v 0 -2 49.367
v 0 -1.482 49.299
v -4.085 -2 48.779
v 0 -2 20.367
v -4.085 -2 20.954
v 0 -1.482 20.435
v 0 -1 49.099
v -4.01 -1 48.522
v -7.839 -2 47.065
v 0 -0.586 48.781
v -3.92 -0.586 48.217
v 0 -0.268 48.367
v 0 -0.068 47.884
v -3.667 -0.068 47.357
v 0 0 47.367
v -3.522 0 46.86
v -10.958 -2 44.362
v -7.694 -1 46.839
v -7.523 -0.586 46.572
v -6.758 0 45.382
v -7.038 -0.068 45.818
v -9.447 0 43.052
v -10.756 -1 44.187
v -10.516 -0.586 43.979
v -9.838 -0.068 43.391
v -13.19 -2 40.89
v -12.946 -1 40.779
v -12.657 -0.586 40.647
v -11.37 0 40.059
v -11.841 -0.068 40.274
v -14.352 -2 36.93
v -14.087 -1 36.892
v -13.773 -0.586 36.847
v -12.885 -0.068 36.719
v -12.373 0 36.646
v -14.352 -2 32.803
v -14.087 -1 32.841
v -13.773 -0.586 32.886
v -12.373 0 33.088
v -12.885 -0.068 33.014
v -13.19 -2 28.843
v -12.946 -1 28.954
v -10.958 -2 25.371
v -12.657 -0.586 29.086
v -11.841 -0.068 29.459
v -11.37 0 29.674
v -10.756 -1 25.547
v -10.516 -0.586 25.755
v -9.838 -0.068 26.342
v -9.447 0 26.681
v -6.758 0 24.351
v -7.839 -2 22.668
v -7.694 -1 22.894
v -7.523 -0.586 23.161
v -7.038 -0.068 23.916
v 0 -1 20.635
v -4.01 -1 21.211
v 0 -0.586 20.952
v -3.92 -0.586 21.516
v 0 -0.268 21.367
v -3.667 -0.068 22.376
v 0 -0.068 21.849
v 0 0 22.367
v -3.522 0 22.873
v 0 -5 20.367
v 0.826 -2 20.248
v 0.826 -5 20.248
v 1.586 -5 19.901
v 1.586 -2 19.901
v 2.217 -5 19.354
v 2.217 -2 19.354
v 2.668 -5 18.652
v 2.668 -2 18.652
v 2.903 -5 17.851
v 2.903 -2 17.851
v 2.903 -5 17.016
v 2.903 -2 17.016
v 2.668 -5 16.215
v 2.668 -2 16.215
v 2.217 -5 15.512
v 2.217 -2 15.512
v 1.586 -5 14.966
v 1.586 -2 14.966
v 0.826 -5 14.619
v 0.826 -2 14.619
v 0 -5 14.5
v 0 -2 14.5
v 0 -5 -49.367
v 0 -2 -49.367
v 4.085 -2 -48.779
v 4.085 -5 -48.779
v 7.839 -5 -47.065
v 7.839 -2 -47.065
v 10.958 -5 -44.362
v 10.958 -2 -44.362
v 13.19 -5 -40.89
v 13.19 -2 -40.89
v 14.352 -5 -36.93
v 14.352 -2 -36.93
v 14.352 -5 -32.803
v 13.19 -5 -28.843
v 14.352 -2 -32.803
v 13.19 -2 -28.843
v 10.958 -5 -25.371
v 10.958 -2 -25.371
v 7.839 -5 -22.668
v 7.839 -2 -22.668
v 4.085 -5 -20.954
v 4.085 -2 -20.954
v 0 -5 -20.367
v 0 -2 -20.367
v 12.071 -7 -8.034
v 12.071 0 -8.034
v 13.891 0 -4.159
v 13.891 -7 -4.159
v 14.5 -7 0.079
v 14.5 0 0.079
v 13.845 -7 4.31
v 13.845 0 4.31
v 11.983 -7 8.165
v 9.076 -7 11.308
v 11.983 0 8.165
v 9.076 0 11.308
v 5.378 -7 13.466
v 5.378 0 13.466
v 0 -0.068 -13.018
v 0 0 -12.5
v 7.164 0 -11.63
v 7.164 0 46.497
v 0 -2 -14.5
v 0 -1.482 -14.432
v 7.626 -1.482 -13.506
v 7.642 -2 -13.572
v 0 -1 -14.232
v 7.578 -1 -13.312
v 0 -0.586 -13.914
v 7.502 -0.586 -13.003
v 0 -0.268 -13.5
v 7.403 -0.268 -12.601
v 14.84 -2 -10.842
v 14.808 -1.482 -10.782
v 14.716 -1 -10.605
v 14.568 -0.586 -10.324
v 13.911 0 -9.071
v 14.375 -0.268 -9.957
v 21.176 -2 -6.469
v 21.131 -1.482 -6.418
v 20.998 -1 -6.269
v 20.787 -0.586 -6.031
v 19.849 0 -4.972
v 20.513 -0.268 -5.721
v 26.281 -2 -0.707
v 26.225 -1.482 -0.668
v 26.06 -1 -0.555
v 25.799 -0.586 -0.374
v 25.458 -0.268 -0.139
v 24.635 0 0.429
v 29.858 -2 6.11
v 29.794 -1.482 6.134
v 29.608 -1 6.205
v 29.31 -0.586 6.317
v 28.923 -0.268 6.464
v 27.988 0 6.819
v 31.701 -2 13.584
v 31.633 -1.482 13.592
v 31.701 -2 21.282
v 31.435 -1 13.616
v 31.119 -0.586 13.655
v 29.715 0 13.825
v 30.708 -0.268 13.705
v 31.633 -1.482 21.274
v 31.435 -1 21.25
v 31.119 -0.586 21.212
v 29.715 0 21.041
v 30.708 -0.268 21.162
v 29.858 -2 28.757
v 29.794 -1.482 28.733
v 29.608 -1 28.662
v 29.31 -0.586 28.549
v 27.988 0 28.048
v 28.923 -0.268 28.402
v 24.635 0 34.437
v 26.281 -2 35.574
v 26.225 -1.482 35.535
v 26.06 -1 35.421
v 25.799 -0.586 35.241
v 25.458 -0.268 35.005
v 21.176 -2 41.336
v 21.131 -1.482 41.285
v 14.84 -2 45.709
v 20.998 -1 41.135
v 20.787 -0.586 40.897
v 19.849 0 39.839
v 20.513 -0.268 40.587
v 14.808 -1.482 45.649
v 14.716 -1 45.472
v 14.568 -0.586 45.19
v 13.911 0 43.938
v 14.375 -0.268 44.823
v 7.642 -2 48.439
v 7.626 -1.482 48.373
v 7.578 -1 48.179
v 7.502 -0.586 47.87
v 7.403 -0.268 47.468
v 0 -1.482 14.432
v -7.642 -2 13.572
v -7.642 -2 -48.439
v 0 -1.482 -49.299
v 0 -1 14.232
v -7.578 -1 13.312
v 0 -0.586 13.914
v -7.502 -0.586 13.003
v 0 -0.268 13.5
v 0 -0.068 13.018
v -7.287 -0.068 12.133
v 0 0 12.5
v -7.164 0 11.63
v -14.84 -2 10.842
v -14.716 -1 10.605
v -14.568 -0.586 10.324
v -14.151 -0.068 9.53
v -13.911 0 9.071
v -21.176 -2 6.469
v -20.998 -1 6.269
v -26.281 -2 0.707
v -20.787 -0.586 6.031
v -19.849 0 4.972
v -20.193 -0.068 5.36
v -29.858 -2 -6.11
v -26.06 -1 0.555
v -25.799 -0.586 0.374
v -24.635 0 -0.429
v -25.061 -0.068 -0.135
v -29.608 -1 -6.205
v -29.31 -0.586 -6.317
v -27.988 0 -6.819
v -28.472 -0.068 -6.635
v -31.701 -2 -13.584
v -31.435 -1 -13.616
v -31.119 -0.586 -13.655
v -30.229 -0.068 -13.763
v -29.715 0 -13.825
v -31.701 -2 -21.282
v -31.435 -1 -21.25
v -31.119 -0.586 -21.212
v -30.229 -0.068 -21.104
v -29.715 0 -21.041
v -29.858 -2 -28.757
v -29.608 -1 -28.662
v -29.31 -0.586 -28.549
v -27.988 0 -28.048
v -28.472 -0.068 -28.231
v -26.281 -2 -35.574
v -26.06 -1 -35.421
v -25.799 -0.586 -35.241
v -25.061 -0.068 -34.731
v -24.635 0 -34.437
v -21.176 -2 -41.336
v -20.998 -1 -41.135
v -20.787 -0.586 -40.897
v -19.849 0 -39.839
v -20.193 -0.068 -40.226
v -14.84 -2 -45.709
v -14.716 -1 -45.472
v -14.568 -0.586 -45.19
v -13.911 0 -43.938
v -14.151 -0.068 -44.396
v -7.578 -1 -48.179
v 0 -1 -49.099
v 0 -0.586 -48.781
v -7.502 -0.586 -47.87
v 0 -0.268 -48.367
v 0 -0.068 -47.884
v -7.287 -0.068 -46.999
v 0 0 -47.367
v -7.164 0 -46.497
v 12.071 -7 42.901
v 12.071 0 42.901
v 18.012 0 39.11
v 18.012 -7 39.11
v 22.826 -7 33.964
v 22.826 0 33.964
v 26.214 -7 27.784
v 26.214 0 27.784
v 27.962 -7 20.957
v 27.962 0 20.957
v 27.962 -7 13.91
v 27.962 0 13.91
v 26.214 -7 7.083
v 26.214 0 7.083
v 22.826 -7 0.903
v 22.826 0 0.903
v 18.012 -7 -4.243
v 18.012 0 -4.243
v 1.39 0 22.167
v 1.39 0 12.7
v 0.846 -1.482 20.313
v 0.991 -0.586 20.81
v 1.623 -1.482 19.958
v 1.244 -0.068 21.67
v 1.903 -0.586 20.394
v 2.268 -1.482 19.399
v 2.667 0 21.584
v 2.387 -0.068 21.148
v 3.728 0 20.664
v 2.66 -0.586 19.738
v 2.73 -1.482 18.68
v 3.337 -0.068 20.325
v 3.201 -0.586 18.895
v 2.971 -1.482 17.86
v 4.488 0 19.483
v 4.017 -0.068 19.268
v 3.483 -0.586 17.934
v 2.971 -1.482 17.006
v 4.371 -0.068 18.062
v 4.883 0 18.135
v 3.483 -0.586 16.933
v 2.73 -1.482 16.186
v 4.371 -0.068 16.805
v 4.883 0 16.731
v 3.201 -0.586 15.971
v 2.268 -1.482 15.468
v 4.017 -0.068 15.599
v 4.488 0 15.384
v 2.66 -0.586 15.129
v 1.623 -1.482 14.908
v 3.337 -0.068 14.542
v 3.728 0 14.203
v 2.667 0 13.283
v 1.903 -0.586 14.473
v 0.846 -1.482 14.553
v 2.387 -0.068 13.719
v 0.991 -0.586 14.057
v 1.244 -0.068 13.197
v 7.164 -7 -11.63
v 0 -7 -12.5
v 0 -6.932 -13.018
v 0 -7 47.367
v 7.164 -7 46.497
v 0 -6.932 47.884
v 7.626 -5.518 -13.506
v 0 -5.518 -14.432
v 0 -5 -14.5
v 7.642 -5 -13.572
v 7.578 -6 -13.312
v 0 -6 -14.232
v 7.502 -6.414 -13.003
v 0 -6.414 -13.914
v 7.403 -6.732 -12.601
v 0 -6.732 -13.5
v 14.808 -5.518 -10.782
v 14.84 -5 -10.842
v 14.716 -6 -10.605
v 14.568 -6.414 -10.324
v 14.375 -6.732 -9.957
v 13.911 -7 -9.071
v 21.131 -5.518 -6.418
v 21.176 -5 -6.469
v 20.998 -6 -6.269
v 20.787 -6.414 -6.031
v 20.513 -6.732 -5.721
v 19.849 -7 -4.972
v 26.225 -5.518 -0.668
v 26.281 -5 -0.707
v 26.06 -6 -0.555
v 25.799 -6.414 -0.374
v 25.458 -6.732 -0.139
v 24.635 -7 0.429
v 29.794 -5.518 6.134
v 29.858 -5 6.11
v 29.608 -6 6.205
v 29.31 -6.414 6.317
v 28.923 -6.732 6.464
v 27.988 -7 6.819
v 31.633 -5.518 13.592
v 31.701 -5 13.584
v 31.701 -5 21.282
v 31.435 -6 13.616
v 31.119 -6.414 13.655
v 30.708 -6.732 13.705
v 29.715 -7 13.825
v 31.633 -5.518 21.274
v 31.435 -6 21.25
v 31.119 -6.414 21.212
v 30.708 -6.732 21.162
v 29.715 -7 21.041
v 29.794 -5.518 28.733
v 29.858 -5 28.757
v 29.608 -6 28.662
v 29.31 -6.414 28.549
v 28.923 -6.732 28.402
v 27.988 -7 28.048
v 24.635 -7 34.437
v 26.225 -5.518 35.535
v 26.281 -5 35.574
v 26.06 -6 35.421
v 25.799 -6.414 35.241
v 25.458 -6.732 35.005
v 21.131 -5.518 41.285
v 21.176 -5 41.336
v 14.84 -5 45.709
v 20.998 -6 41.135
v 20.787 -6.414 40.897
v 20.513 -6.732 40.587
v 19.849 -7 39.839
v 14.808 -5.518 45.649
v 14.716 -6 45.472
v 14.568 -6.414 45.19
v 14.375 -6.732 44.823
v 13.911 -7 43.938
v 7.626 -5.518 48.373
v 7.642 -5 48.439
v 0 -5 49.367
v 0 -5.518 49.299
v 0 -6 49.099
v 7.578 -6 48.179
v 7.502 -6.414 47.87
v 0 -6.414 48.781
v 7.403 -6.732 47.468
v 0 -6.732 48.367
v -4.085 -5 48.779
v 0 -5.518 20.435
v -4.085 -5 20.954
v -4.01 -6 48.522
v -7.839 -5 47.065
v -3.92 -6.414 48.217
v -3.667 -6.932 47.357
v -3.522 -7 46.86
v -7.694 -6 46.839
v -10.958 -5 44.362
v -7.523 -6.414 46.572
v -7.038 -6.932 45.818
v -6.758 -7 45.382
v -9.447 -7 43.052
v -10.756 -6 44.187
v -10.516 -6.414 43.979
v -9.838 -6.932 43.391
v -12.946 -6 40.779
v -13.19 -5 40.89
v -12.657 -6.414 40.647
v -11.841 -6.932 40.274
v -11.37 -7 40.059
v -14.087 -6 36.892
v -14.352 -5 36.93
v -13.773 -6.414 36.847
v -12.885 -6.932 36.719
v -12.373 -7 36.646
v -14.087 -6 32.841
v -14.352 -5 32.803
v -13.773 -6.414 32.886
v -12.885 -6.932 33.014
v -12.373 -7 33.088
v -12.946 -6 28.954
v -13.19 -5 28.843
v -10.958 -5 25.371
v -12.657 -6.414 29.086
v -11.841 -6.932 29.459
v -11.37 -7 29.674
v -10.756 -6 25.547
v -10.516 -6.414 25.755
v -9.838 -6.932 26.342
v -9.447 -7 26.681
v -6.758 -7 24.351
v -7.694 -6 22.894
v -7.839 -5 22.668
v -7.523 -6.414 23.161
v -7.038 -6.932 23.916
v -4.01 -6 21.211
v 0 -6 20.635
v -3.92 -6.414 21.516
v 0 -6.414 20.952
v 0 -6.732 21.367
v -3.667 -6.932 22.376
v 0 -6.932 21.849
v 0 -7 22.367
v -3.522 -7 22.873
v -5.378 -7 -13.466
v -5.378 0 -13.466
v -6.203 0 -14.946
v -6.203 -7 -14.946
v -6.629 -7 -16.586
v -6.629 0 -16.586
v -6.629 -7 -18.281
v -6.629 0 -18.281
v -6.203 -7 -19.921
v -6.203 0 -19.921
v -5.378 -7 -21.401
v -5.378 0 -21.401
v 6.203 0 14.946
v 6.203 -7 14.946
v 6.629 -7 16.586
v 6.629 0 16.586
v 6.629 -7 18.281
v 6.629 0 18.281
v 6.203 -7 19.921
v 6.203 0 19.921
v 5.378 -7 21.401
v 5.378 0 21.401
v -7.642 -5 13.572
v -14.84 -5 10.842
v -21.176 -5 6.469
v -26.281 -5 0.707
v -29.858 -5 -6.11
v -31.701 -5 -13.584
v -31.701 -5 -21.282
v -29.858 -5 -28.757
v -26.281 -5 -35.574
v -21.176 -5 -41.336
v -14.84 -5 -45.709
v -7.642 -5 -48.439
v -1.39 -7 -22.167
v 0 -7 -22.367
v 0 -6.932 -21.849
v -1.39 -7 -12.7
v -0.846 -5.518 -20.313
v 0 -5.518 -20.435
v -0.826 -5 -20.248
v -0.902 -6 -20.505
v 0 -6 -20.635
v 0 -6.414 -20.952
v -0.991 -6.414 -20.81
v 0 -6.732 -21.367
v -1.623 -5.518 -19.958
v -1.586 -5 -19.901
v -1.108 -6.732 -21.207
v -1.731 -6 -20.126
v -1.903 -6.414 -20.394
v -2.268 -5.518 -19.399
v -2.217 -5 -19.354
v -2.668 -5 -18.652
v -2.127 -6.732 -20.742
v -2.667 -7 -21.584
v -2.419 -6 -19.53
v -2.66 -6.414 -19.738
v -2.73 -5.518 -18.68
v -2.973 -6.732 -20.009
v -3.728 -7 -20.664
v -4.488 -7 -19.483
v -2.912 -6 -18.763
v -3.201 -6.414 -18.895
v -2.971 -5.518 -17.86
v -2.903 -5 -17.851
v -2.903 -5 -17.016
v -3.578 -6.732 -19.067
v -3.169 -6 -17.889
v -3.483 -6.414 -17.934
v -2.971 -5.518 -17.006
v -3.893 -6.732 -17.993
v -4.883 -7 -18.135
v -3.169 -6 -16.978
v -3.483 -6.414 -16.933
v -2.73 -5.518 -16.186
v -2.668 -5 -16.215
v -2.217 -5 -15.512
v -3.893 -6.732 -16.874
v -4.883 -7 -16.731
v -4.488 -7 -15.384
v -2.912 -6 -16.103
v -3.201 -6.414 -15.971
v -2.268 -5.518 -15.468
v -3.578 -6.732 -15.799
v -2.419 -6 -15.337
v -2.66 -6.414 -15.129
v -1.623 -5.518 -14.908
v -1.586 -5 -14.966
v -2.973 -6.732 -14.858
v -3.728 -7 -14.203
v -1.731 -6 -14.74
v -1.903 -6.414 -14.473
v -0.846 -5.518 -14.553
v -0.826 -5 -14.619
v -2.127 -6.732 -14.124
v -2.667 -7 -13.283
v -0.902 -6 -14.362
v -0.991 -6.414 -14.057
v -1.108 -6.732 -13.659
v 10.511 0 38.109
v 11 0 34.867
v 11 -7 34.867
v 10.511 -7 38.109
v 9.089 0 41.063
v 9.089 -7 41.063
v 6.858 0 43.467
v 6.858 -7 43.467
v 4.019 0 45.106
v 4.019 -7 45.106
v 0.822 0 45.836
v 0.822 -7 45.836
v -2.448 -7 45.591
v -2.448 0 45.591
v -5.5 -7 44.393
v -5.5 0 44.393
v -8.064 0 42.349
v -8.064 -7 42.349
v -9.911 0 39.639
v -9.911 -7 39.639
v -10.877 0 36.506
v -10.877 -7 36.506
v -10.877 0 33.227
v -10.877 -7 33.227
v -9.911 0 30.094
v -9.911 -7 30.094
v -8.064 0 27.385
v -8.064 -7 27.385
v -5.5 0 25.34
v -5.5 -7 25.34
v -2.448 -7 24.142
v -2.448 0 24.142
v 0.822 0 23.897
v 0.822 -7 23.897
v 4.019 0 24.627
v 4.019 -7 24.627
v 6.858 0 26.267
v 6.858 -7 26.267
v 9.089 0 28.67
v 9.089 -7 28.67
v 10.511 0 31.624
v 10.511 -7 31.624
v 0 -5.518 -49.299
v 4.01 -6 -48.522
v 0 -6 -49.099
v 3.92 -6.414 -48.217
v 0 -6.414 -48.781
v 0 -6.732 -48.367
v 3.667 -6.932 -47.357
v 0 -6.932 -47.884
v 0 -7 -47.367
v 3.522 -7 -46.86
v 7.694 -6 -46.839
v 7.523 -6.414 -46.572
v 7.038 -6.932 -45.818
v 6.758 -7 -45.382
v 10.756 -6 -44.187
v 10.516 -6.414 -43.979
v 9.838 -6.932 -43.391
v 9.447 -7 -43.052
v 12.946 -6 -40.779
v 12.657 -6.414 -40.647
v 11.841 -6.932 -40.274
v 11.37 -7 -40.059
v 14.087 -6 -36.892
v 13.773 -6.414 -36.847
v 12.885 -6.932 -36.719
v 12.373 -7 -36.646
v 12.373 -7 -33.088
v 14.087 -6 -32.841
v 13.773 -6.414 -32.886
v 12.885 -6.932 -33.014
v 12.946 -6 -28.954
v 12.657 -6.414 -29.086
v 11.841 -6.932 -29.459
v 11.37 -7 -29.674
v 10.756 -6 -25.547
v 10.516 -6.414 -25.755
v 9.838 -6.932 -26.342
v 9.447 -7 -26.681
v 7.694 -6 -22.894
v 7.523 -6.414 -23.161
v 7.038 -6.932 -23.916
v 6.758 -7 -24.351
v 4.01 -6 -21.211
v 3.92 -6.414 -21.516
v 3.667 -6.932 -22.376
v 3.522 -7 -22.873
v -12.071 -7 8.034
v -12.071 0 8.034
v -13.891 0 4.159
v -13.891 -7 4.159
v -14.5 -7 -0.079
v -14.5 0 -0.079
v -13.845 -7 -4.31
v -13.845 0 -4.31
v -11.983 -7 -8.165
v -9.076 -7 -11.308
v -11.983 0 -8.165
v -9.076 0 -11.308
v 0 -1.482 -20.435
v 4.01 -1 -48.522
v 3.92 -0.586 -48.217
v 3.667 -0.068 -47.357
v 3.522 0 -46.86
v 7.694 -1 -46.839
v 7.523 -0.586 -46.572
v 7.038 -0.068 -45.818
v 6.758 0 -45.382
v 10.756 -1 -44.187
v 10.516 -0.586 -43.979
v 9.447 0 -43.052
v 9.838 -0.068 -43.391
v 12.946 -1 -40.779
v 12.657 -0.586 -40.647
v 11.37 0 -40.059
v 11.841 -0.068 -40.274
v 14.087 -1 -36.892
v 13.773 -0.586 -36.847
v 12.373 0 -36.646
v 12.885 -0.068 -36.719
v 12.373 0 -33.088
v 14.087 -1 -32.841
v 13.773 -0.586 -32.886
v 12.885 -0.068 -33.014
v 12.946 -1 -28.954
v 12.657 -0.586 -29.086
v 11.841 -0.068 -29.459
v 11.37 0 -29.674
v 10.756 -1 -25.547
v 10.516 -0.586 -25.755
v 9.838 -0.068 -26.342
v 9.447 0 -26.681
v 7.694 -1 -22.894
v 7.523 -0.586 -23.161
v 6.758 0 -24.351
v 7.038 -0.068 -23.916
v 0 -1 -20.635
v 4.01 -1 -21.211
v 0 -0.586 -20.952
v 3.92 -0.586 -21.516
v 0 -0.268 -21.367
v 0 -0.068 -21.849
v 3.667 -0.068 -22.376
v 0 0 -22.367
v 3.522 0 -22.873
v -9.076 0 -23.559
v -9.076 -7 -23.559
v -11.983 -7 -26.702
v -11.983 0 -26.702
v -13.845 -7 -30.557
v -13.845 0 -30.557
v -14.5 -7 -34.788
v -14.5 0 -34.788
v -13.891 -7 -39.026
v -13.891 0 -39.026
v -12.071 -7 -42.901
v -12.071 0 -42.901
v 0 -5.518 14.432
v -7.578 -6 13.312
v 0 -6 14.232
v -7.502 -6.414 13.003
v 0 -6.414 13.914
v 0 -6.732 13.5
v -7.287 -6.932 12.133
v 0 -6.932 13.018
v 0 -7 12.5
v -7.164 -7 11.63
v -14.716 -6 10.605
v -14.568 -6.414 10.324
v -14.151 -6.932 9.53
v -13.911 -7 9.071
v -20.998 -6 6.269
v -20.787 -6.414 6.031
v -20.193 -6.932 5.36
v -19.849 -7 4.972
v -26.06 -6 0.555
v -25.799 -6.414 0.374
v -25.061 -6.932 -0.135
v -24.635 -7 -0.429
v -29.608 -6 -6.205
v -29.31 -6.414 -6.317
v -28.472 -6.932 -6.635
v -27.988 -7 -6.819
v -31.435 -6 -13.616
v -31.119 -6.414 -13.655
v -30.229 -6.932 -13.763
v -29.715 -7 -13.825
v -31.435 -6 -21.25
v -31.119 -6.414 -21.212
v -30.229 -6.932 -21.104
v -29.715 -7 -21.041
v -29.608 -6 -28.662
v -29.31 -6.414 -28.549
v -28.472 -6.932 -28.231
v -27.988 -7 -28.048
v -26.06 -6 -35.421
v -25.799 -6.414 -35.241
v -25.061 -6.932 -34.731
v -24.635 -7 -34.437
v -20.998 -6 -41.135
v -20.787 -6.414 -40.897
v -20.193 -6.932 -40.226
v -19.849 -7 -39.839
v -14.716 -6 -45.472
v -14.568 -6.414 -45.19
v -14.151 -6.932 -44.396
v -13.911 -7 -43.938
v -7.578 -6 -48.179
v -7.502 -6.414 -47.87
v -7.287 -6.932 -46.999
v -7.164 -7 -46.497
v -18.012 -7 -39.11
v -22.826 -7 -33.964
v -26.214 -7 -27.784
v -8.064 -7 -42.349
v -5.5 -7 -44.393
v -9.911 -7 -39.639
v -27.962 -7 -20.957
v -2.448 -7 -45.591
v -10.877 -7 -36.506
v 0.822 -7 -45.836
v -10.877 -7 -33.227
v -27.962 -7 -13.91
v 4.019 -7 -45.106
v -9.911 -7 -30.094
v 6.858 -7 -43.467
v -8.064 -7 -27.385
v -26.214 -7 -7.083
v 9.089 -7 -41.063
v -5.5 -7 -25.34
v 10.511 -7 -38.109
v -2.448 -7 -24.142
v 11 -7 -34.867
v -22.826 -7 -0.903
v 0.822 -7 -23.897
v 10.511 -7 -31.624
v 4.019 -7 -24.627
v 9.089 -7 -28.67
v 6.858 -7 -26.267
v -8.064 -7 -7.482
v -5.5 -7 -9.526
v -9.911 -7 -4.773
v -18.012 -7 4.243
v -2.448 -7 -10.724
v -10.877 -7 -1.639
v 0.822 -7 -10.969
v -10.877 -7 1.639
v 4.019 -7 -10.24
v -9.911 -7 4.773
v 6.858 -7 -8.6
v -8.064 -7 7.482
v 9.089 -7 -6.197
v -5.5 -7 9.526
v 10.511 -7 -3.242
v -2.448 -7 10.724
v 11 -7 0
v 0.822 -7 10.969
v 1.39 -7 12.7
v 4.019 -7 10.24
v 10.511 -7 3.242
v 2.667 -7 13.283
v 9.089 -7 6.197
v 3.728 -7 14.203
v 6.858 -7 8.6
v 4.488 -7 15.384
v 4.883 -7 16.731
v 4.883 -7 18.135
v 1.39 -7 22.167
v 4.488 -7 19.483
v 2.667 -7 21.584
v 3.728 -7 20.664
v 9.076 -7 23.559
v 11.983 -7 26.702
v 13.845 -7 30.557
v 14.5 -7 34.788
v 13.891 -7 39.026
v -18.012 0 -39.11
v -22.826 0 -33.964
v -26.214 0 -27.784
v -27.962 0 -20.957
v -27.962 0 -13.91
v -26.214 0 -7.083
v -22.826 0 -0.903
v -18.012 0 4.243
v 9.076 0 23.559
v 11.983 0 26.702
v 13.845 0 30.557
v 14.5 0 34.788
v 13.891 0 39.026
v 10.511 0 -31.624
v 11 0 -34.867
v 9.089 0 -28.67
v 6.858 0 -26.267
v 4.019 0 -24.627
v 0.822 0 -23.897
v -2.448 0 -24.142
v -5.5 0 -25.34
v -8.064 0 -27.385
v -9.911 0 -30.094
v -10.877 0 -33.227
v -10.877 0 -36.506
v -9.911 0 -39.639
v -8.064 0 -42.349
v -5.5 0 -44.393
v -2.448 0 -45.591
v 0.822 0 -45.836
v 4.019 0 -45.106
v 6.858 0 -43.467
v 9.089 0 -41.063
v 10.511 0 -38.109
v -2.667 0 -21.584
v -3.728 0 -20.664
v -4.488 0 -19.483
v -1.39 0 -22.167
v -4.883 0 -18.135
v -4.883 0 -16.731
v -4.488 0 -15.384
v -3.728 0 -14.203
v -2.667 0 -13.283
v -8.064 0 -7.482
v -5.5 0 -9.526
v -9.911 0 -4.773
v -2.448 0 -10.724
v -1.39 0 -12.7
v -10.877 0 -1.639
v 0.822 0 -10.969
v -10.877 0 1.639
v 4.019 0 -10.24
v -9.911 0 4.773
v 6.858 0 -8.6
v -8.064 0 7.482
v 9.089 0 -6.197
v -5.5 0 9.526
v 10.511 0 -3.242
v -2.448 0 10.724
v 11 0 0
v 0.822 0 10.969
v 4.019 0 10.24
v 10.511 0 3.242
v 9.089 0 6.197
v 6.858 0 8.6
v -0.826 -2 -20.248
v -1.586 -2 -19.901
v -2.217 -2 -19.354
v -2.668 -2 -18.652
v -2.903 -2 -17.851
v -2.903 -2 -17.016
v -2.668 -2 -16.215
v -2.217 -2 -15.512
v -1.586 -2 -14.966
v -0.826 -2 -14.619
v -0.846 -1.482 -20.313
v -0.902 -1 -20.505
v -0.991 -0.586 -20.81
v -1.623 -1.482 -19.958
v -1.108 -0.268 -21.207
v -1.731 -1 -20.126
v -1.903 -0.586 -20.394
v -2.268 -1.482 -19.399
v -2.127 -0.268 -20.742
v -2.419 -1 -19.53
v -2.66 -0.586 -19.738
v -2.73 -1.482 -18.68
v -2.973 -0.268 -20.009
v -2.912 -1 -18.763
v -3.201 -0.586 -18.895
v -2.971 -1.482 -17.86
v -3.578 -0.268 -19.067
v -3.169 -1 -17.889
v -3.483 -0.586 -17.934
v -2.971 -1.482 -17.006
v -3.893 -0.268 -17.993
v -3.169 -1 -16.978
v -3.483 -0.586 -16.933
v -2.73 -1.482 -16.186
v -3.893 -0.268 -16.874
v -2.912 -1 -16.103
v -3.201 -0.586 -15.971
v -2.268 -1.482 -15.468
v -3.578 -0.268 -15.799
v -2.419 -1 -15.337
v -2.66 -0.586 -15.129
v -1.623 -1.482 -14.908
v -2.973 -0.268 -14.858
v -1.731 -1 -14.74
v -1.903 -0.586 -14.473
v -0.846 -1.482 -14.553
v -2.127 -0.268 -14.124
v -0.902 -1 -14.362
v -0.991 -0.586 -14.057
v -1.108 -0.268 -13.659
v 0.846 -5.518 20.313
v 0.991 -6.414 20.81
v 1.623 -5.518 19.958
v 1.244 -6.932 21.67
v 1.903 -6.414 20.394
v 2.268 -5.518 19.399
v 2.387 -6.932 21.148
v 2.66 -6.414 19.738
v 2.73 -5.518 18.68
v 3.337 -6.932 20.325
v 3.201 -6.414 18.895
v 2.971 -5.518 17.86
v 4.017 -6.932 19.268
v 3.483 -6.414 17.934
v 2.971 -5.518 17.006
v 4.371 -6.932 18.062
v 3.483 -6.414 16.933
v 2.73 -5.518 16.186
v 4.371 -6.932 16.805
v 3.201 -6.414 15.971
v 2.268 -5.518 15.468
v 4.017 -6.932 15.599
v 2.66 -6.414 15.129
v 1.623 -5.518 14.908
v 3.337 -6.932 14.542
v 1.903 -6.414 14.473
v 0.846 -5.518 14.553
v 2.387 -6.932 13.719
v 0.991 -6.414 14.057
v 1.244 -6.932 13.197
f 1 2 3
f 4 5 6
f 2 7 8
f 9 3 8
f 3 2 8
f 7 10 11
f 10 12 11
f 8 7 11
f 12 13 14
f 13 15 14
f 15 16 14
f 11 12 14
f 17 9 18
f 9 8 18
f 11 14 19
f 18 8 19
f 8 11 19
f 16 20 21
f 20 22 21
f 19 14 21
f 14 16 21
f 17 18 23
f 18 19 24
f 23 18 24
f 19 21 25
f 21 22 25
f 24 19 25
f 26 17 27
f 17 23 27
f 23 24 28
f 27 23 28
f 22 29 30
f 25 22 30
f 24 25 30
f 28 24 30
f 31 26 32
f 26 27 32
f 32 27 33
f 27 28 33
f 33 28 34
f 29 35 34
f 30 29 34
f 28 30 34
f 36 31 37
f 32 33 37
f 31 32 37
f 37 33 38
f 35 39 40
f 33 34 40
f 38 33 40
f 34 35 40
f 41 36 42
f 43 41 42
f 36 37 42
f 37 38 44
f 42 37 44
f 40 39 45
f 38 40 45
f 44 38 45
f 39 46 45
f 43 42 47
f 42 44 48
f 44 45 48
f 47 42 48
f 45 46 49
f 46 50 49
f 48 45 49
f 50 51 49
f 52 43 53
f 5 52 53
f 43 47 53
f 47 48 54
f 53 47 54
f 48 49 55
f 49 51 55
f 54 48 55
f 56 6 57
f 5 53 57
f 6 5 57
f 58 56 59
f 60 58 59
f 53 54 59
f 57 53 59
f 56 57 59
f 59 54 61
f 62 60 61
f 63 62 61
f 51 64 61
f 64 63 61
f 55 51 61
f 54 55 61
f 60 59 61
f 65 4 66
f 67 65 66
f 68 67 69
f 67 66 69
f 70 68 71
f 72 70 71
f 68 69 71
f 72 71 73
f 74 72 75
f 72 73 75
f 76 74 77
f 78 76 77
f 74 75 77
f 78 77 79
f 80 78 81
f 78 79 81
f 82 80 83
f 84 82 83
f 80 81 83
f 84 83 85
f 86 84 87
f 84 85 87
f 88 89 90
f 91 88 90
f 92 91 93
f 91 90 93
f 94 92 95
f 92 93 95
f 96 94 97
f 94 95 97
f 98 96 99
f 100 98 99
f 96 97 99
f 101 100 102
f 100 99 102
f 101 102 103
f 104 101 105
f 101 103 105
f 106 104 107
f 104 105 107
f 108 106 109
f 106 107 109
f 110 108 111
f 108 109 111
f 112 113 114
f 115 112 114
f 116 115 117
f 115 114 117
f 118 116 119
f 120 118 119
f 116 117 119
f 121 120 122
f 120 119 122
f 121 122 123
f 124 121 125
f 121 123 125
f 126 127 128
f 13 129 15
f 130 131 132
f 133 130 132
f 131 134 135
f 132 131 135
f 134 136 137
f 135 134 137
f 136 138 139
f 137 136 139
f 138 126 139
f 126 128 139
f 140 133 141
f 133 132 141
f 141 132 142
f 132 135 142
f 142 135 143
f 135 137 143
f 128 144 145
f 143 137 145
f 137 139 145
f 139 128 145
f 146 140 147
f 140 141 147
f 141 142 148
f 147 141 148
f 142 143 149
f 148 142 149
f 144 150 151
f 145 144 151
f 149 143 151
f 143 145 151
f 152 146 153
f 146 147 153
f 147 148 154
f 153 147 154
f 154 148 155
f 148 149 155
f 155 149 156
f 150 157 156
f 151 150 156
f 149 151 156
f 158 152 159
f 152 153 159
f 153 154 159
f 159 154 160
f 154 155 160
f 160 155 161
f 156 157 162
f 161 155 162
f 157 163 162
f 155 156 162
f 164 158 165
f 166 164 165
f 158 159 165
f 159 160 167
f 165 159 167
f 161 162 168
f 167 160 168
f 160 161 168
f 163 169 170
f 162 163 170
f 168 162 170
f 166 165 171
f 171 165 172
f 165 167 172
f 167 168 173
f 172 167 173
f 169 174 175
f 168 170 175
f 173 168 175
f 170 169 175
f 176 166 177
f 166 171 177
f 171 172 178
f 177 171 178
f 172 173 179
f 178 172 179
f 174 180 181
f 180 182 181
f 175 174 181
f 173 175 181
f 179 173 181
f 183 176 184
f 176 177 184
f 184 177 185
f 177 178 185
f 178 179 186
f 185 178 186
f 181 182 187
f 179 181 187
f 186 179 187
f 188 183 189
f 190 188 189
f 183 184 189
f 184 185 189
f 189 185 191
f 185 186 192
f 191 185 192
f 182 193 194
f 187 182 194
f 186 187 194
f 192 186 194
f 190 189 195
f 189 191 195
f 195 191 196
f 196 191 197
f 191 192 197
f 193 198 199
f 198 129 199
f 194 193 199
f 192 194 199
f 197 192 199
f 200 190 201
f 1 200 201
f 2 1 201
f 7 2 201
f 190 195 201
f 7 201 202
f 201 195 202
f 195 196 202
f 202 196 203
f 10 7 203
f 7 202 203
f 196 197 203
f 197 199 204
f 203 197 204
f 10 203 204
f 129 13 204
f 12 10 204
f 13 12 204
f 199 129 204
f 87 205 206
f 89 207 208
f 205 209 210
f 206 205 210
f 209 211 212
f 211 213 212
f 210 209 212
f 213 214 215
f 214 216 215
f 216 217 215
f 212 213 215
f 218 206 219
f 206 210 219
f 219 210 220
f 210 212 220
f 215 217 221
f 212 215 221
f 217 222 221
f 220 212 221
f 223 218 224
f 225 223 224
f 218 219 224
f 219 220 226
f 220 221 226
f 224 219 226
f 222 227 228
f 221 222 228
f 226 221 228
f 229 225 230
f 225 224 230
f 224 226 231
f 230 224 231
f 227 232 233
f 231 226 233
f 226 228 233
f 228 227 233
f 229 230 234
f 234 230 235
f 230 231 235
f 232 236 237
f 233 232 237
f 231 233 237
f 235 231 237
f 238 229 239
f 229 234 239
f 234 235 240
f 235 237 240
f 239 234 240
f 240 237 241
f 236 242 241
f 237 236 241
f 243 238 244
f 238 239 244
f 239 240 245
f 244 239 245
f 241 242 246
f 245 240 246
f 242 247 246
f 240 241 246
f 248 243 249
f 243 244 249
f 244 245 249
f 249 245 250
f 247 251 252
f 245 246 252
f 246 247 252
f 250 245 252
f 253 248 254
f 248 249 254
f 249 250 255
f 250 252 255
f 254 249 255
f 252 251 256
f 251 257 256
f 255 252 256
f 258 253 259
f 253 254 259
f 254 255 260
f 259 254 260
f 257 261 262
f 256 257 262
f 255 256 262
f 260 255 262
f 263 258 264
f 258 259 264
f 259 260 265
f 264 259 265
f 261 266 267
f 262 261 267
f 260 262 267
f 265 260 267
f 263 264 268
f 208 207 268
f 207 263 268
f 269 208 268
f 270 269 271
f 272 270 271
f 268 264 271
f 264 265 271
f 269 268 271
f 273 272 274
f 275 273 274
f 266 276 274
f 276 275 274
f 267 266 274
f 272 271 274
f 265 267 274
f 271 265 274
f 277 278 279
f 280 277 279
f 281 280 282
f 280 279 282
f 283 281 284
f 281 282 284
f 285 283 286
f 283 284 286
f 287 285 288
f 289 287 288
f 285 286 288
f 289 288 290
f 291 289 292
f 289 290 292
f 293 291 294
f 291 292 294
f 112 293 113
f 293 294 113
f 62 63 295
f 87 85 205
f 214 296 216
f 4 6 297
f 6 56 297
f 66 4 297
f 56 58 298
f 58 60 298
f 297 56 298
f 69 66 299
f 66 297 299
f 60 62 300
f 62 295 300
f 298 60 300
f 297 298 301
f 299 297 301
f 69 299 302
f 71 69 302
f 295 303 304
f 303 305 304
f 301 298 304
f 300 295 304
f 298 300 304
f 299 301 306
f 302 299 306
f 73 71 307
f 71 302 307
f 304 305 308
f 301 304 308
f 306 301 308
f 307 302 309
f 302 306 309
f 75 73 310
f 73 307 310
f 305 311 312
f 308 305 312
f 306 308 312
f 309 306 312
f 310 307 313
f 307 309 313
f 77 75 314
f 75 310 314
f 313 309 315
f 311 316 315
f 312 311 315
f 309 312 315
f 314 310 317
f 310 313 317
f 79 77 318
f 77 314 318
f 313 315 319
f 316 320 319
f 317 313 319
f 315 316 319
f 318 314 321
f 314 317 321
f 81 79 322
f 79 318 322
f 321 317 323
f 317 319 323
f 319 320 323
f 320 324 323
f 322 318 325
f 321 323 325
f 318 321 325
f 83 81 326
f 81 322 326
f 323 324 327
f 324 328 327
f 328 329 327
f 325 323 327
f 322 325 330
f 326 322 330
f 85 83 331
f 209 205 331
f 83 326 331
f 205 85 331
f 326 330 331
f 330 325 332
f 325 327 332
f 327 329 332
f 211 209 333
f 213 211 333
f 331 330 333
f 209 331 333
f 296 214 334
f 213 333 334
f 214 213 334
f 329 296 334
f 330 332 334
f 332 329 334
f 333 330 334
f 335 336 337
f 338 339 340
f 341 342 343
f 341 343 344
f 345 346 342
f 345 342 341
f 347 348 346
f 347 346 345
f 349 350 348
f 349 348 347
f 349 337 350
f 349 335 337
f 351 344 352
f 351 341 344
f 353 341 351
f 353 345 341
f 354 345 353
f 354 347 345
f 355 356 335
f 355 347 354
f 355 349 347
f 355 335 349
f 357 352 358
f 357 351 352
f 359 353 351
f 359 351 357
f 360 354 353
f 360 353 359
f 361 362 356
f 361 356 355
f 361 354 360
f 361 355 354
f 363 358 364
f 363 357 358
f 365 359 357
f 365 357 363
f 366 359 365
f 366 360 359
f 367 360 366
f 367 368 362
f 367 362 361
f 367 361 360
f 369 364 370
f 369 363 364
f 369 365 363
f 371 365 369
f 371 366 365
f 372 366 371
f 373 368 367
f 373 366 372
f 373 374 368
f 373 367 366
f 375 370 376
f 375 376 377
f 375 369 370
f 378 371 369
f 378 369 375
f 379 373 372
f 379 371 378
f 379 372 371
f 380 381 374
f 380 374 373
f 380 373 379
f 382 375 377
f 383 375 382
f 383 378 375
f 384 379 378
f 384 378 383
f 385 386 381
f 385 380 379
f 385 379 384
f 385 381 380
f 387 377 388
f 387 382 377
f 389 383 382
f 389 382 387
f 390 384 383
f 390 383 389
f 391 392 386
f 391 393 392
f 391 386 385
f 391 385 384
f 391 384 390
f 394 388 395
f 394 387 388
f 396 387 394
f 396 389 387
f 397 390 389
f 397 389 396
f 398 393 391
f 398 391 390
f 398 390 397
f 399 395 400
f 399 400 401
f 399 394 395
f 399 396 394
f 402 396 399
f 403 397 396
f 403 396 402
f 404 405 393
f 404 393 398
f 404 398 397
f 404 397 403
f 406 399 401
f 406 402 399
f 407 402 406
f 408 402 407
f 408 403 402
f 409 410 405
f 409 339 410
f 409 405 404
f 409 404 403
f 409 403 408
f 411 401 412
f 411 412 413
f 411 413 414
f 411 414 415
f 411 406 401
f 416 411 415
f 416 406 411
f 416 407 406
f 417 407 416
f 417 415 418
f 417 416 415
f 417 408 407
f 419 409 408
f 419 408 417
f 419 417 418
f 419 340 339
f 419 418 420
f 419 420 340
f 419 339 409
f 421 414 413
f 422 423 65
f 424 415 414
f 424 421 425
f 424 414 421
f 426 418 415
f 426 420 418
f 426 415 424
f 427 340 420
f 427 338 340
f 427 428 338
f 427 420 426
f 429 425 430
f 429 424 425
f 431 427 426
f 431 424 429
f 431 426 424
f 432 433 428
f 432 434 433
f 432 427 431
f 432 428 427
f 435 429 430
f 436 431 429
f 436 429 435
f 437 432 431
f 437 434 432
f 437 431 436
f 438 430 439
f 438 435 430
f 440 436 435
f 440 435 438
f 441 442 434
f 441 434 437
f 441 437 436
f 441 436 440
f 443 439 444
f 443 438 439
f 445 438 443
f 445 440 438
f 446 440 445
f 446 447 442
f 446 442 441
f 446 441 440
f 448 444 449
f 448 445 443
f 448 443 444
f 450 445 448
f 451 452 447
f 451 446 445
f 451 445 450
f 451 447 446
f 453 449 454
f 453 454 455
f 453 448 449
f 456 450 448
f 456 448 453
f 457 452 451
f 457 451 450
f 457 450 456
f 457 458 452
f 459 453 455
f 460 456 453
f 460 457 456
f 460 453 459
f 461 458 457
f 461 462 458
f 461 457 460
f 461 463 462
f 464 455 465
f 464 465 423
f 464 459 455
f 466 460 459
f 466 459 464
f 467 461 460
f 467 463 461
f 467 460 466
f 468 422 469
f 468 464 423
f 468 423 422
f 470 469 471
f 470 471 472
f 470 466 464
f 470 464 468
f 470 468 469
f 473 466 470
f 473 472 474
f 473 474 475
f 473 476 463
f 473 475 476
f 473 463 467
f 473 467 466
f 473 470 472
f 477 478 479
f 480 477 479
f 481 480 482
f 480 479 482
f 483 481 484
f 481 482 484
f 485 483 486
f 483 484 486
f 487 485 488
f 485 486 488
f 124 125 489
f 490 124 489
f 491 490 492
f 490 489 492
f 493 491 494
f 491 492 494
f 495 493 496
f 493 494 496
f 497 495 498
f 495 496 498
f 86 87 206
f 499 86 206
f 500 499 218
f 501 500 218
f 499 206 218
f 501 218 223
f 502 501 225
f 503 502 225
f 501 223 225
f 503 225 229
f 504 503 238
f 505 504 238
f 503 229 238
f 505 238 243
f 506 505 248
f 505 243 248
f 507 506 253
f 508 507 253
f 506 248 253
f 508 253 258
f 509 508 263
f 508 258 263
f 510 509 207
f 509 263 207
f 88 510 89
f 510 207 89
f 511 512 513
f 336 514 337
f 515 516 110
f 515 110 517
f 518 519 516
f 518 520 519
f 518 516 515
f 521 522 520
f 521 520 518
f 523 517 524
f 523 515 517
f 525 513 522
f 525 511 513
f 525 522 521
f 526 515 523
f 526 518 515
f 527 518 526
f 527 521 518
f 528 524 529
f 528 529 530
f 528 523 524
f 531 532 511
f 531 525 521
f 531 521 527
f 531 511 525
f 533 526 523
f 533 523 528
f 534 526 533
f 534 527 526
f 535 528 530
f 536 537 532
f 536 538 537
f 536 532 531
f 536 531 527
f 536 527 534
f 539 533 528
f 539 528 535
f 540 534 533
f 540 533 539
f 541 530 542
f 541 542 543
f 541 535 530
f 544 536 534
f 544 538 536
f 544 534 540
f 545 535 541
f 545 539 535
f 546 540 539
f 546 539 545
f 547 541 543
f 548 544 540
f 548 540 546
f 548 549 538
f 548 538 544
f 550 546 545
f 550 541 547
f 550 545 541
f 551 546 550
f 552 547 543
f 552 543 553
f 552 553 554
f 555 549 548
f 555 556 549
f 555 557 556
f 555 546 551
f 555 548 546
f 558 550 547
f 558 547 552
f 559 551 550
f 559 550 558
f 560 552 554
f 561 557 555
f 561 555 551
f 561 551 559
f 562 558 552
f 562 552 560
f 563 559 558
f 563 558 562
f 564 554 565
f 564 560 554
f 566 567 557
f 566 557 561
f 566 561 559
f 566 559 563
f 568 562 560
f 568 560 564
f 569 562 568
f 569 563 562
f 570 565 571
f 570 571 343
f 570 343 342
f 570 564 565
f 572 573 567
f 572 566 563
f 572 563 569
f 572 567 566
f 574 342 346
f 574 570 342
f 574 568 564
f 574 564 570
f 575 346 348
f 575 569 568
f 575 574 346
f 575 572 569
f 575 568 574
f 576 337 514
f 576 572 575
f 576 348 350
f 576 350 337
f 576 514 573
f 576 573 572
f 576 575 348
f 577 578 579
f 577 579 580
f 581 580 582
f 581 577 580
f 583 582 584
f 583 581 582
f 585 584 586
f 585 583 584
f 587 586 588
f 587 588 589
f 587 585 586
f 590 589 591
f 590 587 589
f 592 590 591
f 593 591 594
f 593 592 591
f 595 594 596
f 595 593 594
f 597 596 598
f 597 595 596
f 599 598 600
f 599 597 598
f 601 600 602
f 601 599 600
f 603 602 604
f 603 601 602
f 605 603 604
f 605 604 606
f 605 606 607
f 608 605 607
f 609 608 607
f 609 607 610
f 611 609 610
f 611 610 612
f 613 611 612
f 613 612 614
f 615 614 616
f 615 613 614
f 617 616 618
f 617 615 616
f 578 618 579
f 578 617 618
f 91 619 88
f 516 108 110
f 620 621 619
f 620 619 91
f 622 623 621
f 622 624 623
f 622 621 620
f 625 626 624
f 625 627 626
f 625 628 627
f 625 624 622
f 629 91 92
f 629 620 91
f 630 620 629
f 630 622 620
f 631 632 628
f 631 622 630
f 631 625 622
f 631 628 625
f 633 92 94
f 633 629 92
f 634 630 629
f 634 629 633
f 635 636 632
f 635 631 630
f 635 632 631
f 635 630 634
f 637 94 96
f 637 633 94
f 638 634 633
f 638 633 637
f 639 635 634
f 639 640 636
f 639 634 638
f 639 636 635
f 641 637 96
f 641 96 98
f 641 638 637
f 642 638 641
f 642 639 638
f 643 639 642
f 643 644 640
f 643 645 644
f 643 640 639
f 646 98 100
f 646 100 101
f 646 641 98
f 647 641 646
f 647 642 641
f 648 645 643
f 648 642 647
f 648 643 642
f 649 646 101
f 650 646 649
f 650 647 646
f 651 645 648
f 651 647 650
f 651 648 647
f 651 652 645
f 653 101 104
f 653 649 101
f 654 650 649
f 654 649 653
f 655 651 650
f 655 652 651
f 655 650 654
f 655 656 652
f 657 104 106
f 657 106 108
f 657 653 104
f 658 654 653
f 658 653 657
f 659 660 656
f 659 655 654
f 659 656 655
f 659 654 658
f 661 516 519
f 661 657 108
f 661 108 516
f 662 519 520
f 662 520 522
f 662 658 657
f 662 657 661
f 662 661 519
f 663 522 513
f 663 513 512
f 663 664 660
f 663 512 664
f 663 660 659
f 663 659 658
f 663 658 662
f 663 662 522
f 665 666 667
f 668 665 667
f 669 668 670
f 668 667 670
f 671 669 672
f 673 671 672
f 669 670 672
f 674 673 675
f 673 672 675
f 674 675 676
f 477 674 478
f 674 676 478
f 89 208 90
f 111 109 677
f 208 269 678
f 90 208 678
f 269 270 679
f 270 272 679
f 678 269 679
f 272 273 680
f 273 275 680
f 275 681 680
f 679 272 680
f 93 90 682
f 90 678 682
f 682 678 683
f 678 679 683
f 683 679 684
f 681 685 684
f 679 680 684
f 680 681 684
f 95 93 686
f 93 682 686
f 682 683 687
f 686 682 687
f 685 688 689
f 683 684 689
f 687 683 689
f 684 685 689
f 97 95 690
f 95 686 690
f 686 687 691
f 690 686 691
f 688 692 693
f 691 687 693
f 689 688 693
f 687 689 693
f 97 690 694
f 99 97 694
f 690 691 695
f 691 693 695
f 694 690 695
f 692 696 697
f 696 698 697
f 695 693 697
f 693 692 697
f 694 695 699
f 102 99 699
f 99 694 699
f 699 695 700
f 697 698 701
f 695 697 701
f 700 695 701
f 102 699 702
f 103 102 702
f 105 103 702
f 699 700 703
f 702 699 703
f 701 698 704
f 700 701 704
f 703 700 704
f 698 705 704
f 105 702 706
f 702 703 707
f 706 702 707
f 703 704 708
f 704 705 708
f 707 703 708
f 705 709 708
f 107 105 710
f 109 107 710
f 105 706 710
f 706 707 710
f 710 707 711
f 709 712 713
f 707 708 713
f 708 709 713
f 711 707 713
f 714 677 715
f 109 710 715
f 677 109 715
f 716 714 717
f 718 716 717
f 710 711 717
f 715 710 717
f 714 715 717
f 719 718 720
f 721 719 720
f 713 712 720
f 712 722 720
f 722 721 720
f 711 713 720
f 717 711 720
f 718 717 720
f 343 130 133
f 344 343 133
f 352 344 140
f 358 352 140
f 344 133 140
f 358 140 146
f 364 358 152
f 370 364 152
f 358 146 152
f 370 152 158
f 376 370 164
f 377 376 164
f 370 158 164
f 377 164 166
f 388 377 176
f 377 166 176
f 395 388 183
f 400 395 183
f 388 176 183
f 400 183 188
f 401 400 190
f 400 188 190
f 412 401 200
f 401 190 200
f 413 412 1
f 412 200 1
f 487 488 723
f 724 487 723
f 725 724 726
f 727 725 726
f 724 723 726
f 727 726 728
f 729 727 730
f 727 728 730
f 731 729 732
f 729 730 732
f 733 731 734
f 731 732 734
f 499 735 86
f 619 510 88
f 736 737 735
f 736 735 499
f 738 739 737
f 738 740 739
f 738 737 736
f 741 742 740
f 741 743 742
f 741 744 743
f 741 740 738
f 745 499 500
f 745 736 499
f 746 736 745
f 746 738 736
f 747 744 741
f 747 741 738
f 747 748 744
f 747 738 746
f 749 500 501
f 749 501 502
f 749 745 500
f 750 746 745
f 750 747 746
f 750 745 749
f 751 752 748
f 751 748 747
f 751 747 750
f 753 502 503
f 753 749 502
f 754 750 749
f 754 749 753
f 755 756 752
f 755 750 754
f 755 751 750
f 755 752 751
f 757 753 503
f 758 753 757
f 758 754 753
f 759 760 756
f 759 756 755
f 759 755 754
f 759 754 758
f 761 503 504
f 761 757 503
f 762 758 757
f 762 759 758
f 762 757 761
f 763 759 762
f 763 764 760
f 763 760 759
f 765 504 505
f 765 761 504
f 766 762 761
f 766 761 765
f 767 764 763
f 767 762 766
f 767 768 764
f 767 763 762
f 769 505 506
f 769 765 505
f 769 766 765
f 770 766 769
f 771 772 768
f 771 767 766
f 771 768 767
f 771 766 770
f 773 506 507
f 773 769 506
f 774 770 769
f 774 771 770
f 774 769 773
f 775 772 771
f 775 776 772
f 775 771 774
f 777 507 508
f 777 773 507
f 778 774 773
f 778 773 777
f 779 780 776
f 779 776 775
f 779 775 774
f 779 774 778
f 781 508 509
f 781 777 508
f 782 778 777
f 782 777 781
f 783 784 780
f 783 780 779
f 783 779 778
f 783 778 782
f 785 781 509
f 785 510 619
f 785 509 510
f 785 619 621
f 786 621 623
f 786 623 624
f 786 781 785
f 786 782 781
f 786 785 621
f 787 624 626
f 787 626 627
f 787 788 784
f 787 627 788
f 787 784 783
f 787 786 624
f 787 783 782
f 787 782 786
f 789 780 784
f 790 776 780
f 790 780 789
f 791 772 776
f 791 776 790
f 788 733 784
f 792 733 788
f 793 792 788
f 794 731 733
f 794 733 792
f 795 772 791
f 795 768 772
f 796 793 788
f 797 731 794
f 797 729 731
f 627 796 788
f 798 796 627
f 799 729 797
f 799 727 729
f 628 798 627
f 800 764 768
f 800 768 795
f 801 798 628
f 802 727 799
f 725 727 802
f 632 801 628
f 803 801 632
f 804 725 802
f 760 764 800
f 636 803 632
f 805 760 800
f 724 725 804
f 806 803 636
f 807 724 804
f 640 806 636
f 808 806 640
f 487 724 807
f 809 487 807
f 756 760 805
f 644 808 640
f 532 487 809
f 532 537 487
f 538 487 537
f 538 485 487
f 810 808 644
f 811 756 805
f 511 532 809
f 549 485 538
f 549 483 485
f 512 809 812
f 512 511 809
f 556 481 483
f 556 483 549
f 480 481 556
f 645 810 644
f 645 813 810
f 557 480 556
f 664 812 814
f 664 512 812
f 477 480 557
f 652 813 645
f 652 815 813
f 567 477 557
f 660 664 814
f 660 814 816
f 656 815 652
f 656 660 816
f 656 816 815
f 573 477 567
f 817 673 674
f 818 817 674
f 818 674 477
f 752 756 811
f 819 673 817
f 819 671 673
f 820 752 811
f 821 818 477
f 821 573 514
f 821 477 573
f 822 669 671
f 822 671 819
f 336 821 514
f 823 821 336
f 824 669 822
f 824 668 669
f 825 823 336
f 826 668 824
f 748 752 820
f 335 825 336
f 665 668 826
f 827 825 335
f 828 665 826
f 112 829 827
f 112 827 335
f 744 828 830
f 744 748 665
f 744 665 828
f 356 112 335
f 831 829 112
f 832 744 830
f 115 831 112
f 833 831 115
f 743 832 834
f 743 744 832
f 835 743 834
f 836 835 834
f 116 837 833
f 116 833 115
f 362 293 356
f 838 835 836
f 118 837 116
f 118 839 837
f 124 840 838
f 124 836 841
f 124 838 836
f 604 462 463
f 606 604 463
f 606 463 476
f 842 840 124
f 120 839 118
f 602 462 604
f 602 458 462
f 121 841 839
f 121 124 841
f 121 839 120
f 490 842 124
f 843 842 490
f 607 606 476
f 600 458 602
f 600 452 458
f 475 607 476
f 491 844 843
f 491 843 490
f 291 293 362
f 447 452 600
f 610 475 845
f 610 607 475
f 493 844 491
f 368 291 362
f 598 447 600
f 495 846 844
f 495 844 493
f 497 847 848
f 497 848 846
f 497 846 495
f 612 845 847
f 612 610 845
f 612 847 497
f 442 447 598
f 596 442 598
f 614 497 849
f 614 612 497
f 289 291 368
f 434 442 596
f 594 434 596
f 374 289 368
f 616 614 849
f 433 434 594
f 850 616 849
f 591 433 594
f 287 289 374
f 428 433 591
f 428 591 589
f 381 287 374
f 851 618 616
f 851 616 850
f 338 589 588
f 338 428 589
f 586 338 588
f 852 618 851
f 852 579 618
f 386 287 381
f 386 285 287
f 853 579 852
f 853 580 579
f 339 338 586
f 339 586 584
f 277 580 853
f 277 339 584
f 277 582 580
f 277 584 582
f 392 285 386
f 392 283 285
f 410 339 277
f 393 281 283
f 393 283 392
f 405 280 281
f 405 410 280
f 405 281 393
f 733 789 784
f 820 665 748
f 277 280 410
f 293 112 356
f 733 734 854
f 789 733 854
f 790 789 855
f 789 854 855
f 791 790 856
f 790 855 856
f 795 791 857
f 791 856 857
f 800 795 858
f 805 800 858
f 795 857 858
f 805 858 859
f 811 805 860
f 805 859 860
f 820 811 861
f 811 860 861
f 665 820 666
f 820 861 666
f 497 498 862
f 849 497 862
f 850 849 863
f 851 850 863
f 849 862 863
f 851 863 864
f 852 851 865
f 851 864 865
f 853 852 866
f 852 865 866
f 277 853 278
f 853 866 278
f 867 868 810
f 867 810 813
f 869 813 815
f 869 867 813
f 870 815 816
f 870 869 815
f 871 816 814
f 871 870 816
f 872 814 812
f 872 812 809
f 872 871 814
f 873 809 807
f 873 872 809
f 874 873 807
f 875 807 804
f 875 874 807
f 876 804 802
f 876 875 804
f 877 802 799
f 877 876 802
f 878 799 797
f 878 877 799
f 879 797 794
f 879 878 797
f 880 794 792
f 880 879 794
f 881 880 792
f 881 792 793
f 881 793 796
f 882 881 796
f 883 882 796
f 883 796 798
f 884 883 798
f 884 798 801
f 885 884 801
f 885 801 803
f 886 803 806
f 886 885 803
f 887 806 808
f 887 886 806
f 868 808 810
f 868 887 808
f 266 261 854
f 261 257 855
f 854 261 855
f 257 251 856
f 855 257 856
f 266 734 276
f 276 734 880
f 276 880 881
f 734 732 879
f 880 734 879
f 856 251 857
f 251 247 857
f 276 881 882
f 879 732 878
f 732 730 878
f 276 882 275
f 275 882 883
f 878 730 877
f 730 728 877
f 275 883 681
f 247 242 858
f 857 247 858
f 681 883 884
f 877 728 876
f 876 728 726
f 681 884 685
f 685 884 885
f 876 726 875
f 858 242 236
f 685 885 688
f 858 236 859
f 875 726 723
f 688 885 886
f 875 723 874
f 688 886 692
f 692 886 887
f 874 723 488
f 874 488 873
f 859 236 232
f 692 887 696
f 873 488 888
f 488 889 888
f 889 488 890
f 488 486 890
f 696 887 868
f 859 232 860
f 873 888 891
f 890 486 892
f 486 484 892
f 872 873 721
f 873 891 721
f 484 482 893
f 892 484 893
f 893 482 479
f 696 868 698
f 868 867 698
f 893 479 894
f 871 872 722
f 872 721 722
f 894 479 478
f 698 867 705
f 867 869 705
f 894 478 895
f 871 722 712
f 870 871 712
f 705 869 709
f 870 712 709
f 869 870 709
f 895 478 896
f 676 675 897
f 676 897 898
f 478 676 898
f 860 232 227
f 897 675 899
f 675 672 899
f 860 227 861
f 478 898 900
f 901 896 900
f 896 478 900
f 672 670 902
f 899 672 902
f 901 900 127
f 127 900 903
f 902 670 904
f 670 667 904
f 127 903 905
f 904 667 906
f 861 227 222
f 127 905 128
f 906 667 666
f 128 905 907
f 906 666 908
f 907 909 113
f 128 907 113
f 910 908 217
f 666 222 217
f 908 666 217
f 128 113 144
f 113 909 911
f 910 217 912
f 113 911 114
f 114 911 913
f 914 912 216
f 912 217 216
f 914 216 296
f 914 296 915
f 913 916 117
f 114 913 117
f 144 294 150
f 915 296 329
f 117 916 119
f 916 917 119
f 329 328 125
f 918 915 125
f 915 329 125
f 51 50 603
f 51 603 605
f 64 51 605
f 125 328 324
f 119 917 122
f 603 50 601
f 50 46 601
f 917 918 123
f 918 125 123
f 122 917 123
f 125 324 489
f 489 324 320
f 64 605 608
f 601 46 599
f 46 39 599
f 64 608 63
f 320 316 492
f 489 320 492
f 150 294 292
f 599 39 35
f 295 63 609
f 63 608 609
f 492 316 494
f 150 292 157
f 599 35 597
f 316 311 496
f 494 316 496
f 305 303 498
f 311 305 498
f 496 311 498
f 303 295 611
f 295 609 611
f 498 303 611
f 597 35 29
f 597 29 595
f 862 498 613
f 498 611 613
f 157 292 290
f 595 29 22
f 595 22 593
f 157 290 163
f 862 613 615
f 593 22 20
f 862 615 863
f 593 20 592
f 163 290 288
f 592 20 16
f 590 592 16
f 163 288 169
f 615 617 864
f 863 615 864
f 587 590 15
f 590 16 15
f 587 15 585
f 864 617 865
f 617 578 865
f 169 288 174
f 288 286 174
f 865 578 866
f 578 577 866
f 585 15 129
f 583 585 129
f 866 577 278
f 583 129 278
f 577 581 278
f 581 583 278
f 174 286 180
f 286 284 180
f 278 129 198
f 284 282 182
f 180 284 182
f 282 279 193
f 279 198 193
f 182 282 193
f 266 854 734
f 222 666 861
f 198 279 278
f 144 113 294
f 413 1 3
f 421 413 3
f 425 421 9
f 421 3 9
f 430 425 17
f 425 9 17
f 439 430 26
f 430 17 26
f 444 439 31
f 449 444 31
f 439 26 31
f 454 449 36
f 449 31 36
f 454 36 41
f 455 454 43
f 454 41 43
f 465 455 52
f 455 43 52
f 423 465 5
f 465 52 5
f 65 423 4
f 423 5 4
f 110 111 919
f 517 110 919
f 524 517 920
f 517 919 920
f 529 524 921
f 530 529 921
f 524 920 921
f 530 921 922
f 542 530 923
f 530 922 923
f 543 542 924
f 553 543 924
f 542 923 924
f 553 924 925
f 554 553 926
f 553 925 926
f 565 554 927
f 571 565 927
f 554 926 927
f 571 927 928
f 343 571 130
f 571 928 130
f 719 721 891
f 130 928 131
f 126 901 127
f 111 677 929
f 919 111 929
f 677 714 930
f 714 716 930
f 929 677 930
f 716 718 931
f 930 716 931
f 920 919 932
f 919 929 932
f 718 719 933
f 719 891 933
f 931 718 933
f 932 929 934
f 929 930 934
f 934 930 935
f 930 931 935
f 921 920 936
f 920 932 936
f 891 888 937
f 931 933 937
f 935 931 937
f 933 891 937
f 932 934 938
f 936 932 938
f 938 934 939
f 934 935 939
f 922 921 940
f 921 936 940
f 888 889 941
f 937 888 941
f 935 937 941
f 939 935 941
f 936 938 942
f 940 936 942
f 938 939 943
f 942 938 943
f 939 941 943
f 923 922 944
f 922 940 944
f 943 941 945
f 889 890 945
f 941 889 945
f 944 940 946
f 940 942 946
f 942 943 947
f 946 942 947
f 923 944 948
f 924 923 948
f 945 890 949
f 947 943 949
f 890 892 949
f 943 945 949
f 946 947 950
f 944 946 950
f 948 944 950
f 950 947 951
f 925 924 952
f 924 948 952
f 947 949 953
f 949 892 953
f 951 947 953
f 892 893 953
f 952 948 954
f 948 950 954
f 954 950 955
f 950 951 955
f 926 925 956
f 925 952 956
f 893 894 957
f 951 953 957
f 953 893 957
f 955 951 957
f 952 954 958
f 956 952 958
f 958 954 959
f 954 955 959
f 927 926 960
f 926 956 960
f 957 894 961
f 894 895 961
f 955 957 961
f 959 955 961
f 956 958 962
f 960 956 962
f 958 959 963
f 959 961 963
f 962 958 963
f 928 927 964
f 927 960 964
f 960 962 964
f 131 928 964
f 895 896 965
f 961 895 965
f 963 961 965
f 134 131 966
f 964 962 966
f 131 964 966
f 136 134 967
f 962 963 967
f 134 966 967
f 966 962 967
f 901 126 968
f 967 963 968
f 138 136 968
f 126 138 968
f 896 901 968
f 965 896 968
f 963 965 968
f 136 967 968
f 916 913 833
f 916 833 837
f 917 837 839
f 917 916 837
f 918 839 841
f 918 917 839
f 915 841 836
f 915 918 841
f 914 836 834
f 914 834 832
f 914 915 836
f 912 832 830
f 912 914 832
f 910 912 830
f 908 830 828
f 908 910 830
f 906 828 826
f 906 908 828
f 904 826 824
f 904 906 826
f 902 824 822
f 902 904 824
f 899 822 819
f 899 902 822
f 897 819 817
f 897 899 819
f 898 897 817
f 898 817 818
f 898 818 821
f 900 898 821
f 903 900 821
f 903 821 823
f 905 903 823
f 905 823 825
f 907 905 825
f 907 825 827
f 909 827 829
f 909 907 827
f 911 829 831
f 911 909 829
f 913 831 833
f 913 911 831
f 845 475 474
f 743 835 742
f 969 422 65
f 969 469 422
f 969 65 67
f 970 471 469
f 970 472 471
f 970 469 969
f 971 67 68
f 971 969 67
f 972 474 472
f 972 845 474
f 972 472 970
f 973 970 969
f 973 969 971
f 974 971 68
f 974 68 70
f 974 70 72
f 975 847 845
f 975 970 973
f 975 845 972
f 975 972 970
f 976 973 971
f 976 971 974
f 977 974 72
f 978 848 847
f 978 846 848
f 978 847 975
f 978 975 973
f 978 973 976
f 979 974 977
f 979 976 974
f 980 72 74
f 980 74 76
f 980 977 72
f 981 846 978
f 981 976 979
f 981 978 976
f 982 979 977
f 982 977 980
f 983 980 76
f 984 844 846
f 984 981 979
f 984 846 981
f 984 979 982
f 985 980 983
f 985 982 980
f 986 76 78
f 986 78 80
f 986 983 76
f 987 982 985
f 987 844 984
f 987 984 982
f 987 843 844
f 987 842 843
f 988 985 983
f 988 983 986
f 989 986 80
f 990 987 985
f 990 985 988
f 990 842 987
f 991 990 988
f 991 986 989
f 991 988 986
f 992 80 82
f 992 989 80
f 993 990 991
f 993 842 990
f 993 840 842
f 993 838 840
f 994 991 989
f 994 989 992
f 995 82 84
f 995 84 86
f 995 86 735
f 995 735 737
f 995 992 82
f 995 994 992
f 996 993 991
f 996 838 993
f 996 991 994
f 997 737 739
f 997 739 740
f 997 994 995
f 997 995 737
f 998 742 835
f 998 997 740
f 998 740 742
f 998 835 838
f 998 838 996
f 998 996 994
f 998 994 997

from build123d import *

# Parameters (mm, degrees)
F0_R     = 11
F1_DEPTH = 7
F2_R     = 2


with BuildPart() as f1:
    # F0 (on Front) → F1 (new body)
    with BuildSketch(Plane.XZ):
        with BuildLine():
            ThreePointArc((0, -14.5), (31.933333, 17.433333), (0, 49.366667))
            ThreePointArc((0, 49.366667), (-14.5, 34.866667), (0, 20.366667))
            ThreePointArc((0, 20.366667), (2.933333, 17.433333), (0, 14.5))
            ThreePointArc((0, 14.5), (-31.933333, -17.433333), (0, -49.366667))
            ThreePointArc((0, -49.366667), (14.5, -34.866667), (0, -20.366667))
            ThreePointArc((0, -20.366667), (-2.933333, -17.433333), (0, -14.5))
        make_face()
        with BuildLine():
            ThreePointArc((-12.070628, -42.900964), (-28.183333, -17.433333), (-12.070628, 8.034297))
            ThreePointArc((-12.070628, 8.034297), (-13.844773, -4.309553), (-5.378183, -13.465703))
            ThreePointArc((-5.378183, -13.465703), (-6.683333, -17.433333), (-5.378183, -21.400964))
            ThreePointArc((-5.378183, -21.400964), (-13.844773, -30.557114), (-12.070628, -42.900964))
        make_face(mode=Mode.SUBTRACT)
        with Locations((0, -34.866667)):
            Circle(F0_R, mode=Mode.SUBTRACT)
        Circle(F0_R, mode=Mode.SUBTRACT)
        with BuildLine():
            ThreePointArc((12.070628, 42.900964), (28.183333, 17.433333), (12.070628, -8.034297))
            ThreePointArc((12.070628, -8.034297), (13.844773, 4.309553), (5.378183, 13.465703))
            ThreePointArc((5.378183, 13.465703), (6.683333, 17.433333), (5.378183, 21.400964))
            ThreePointArc((5.378183, 21.400964), (13.844773, 30.557114), (12.070628, 42.900964))
        make_face(mode=Mode.SUBTRACT)
        with Locations((0, 34.866667)):
            Circle(F0_R, mode=Mode.SUBTRACT)
    extrude(amount=F1_DEPTH)

    # F2
    f2_edges = [f1.edges().sort_by_distance(p)[0] for p in [
        (-31.933333, -7, -17.433333),
        (-31.933333, 0, -17.433333),
    ]]
    fillet(f2_edges, radius=F2_R)


solid = f1.part
